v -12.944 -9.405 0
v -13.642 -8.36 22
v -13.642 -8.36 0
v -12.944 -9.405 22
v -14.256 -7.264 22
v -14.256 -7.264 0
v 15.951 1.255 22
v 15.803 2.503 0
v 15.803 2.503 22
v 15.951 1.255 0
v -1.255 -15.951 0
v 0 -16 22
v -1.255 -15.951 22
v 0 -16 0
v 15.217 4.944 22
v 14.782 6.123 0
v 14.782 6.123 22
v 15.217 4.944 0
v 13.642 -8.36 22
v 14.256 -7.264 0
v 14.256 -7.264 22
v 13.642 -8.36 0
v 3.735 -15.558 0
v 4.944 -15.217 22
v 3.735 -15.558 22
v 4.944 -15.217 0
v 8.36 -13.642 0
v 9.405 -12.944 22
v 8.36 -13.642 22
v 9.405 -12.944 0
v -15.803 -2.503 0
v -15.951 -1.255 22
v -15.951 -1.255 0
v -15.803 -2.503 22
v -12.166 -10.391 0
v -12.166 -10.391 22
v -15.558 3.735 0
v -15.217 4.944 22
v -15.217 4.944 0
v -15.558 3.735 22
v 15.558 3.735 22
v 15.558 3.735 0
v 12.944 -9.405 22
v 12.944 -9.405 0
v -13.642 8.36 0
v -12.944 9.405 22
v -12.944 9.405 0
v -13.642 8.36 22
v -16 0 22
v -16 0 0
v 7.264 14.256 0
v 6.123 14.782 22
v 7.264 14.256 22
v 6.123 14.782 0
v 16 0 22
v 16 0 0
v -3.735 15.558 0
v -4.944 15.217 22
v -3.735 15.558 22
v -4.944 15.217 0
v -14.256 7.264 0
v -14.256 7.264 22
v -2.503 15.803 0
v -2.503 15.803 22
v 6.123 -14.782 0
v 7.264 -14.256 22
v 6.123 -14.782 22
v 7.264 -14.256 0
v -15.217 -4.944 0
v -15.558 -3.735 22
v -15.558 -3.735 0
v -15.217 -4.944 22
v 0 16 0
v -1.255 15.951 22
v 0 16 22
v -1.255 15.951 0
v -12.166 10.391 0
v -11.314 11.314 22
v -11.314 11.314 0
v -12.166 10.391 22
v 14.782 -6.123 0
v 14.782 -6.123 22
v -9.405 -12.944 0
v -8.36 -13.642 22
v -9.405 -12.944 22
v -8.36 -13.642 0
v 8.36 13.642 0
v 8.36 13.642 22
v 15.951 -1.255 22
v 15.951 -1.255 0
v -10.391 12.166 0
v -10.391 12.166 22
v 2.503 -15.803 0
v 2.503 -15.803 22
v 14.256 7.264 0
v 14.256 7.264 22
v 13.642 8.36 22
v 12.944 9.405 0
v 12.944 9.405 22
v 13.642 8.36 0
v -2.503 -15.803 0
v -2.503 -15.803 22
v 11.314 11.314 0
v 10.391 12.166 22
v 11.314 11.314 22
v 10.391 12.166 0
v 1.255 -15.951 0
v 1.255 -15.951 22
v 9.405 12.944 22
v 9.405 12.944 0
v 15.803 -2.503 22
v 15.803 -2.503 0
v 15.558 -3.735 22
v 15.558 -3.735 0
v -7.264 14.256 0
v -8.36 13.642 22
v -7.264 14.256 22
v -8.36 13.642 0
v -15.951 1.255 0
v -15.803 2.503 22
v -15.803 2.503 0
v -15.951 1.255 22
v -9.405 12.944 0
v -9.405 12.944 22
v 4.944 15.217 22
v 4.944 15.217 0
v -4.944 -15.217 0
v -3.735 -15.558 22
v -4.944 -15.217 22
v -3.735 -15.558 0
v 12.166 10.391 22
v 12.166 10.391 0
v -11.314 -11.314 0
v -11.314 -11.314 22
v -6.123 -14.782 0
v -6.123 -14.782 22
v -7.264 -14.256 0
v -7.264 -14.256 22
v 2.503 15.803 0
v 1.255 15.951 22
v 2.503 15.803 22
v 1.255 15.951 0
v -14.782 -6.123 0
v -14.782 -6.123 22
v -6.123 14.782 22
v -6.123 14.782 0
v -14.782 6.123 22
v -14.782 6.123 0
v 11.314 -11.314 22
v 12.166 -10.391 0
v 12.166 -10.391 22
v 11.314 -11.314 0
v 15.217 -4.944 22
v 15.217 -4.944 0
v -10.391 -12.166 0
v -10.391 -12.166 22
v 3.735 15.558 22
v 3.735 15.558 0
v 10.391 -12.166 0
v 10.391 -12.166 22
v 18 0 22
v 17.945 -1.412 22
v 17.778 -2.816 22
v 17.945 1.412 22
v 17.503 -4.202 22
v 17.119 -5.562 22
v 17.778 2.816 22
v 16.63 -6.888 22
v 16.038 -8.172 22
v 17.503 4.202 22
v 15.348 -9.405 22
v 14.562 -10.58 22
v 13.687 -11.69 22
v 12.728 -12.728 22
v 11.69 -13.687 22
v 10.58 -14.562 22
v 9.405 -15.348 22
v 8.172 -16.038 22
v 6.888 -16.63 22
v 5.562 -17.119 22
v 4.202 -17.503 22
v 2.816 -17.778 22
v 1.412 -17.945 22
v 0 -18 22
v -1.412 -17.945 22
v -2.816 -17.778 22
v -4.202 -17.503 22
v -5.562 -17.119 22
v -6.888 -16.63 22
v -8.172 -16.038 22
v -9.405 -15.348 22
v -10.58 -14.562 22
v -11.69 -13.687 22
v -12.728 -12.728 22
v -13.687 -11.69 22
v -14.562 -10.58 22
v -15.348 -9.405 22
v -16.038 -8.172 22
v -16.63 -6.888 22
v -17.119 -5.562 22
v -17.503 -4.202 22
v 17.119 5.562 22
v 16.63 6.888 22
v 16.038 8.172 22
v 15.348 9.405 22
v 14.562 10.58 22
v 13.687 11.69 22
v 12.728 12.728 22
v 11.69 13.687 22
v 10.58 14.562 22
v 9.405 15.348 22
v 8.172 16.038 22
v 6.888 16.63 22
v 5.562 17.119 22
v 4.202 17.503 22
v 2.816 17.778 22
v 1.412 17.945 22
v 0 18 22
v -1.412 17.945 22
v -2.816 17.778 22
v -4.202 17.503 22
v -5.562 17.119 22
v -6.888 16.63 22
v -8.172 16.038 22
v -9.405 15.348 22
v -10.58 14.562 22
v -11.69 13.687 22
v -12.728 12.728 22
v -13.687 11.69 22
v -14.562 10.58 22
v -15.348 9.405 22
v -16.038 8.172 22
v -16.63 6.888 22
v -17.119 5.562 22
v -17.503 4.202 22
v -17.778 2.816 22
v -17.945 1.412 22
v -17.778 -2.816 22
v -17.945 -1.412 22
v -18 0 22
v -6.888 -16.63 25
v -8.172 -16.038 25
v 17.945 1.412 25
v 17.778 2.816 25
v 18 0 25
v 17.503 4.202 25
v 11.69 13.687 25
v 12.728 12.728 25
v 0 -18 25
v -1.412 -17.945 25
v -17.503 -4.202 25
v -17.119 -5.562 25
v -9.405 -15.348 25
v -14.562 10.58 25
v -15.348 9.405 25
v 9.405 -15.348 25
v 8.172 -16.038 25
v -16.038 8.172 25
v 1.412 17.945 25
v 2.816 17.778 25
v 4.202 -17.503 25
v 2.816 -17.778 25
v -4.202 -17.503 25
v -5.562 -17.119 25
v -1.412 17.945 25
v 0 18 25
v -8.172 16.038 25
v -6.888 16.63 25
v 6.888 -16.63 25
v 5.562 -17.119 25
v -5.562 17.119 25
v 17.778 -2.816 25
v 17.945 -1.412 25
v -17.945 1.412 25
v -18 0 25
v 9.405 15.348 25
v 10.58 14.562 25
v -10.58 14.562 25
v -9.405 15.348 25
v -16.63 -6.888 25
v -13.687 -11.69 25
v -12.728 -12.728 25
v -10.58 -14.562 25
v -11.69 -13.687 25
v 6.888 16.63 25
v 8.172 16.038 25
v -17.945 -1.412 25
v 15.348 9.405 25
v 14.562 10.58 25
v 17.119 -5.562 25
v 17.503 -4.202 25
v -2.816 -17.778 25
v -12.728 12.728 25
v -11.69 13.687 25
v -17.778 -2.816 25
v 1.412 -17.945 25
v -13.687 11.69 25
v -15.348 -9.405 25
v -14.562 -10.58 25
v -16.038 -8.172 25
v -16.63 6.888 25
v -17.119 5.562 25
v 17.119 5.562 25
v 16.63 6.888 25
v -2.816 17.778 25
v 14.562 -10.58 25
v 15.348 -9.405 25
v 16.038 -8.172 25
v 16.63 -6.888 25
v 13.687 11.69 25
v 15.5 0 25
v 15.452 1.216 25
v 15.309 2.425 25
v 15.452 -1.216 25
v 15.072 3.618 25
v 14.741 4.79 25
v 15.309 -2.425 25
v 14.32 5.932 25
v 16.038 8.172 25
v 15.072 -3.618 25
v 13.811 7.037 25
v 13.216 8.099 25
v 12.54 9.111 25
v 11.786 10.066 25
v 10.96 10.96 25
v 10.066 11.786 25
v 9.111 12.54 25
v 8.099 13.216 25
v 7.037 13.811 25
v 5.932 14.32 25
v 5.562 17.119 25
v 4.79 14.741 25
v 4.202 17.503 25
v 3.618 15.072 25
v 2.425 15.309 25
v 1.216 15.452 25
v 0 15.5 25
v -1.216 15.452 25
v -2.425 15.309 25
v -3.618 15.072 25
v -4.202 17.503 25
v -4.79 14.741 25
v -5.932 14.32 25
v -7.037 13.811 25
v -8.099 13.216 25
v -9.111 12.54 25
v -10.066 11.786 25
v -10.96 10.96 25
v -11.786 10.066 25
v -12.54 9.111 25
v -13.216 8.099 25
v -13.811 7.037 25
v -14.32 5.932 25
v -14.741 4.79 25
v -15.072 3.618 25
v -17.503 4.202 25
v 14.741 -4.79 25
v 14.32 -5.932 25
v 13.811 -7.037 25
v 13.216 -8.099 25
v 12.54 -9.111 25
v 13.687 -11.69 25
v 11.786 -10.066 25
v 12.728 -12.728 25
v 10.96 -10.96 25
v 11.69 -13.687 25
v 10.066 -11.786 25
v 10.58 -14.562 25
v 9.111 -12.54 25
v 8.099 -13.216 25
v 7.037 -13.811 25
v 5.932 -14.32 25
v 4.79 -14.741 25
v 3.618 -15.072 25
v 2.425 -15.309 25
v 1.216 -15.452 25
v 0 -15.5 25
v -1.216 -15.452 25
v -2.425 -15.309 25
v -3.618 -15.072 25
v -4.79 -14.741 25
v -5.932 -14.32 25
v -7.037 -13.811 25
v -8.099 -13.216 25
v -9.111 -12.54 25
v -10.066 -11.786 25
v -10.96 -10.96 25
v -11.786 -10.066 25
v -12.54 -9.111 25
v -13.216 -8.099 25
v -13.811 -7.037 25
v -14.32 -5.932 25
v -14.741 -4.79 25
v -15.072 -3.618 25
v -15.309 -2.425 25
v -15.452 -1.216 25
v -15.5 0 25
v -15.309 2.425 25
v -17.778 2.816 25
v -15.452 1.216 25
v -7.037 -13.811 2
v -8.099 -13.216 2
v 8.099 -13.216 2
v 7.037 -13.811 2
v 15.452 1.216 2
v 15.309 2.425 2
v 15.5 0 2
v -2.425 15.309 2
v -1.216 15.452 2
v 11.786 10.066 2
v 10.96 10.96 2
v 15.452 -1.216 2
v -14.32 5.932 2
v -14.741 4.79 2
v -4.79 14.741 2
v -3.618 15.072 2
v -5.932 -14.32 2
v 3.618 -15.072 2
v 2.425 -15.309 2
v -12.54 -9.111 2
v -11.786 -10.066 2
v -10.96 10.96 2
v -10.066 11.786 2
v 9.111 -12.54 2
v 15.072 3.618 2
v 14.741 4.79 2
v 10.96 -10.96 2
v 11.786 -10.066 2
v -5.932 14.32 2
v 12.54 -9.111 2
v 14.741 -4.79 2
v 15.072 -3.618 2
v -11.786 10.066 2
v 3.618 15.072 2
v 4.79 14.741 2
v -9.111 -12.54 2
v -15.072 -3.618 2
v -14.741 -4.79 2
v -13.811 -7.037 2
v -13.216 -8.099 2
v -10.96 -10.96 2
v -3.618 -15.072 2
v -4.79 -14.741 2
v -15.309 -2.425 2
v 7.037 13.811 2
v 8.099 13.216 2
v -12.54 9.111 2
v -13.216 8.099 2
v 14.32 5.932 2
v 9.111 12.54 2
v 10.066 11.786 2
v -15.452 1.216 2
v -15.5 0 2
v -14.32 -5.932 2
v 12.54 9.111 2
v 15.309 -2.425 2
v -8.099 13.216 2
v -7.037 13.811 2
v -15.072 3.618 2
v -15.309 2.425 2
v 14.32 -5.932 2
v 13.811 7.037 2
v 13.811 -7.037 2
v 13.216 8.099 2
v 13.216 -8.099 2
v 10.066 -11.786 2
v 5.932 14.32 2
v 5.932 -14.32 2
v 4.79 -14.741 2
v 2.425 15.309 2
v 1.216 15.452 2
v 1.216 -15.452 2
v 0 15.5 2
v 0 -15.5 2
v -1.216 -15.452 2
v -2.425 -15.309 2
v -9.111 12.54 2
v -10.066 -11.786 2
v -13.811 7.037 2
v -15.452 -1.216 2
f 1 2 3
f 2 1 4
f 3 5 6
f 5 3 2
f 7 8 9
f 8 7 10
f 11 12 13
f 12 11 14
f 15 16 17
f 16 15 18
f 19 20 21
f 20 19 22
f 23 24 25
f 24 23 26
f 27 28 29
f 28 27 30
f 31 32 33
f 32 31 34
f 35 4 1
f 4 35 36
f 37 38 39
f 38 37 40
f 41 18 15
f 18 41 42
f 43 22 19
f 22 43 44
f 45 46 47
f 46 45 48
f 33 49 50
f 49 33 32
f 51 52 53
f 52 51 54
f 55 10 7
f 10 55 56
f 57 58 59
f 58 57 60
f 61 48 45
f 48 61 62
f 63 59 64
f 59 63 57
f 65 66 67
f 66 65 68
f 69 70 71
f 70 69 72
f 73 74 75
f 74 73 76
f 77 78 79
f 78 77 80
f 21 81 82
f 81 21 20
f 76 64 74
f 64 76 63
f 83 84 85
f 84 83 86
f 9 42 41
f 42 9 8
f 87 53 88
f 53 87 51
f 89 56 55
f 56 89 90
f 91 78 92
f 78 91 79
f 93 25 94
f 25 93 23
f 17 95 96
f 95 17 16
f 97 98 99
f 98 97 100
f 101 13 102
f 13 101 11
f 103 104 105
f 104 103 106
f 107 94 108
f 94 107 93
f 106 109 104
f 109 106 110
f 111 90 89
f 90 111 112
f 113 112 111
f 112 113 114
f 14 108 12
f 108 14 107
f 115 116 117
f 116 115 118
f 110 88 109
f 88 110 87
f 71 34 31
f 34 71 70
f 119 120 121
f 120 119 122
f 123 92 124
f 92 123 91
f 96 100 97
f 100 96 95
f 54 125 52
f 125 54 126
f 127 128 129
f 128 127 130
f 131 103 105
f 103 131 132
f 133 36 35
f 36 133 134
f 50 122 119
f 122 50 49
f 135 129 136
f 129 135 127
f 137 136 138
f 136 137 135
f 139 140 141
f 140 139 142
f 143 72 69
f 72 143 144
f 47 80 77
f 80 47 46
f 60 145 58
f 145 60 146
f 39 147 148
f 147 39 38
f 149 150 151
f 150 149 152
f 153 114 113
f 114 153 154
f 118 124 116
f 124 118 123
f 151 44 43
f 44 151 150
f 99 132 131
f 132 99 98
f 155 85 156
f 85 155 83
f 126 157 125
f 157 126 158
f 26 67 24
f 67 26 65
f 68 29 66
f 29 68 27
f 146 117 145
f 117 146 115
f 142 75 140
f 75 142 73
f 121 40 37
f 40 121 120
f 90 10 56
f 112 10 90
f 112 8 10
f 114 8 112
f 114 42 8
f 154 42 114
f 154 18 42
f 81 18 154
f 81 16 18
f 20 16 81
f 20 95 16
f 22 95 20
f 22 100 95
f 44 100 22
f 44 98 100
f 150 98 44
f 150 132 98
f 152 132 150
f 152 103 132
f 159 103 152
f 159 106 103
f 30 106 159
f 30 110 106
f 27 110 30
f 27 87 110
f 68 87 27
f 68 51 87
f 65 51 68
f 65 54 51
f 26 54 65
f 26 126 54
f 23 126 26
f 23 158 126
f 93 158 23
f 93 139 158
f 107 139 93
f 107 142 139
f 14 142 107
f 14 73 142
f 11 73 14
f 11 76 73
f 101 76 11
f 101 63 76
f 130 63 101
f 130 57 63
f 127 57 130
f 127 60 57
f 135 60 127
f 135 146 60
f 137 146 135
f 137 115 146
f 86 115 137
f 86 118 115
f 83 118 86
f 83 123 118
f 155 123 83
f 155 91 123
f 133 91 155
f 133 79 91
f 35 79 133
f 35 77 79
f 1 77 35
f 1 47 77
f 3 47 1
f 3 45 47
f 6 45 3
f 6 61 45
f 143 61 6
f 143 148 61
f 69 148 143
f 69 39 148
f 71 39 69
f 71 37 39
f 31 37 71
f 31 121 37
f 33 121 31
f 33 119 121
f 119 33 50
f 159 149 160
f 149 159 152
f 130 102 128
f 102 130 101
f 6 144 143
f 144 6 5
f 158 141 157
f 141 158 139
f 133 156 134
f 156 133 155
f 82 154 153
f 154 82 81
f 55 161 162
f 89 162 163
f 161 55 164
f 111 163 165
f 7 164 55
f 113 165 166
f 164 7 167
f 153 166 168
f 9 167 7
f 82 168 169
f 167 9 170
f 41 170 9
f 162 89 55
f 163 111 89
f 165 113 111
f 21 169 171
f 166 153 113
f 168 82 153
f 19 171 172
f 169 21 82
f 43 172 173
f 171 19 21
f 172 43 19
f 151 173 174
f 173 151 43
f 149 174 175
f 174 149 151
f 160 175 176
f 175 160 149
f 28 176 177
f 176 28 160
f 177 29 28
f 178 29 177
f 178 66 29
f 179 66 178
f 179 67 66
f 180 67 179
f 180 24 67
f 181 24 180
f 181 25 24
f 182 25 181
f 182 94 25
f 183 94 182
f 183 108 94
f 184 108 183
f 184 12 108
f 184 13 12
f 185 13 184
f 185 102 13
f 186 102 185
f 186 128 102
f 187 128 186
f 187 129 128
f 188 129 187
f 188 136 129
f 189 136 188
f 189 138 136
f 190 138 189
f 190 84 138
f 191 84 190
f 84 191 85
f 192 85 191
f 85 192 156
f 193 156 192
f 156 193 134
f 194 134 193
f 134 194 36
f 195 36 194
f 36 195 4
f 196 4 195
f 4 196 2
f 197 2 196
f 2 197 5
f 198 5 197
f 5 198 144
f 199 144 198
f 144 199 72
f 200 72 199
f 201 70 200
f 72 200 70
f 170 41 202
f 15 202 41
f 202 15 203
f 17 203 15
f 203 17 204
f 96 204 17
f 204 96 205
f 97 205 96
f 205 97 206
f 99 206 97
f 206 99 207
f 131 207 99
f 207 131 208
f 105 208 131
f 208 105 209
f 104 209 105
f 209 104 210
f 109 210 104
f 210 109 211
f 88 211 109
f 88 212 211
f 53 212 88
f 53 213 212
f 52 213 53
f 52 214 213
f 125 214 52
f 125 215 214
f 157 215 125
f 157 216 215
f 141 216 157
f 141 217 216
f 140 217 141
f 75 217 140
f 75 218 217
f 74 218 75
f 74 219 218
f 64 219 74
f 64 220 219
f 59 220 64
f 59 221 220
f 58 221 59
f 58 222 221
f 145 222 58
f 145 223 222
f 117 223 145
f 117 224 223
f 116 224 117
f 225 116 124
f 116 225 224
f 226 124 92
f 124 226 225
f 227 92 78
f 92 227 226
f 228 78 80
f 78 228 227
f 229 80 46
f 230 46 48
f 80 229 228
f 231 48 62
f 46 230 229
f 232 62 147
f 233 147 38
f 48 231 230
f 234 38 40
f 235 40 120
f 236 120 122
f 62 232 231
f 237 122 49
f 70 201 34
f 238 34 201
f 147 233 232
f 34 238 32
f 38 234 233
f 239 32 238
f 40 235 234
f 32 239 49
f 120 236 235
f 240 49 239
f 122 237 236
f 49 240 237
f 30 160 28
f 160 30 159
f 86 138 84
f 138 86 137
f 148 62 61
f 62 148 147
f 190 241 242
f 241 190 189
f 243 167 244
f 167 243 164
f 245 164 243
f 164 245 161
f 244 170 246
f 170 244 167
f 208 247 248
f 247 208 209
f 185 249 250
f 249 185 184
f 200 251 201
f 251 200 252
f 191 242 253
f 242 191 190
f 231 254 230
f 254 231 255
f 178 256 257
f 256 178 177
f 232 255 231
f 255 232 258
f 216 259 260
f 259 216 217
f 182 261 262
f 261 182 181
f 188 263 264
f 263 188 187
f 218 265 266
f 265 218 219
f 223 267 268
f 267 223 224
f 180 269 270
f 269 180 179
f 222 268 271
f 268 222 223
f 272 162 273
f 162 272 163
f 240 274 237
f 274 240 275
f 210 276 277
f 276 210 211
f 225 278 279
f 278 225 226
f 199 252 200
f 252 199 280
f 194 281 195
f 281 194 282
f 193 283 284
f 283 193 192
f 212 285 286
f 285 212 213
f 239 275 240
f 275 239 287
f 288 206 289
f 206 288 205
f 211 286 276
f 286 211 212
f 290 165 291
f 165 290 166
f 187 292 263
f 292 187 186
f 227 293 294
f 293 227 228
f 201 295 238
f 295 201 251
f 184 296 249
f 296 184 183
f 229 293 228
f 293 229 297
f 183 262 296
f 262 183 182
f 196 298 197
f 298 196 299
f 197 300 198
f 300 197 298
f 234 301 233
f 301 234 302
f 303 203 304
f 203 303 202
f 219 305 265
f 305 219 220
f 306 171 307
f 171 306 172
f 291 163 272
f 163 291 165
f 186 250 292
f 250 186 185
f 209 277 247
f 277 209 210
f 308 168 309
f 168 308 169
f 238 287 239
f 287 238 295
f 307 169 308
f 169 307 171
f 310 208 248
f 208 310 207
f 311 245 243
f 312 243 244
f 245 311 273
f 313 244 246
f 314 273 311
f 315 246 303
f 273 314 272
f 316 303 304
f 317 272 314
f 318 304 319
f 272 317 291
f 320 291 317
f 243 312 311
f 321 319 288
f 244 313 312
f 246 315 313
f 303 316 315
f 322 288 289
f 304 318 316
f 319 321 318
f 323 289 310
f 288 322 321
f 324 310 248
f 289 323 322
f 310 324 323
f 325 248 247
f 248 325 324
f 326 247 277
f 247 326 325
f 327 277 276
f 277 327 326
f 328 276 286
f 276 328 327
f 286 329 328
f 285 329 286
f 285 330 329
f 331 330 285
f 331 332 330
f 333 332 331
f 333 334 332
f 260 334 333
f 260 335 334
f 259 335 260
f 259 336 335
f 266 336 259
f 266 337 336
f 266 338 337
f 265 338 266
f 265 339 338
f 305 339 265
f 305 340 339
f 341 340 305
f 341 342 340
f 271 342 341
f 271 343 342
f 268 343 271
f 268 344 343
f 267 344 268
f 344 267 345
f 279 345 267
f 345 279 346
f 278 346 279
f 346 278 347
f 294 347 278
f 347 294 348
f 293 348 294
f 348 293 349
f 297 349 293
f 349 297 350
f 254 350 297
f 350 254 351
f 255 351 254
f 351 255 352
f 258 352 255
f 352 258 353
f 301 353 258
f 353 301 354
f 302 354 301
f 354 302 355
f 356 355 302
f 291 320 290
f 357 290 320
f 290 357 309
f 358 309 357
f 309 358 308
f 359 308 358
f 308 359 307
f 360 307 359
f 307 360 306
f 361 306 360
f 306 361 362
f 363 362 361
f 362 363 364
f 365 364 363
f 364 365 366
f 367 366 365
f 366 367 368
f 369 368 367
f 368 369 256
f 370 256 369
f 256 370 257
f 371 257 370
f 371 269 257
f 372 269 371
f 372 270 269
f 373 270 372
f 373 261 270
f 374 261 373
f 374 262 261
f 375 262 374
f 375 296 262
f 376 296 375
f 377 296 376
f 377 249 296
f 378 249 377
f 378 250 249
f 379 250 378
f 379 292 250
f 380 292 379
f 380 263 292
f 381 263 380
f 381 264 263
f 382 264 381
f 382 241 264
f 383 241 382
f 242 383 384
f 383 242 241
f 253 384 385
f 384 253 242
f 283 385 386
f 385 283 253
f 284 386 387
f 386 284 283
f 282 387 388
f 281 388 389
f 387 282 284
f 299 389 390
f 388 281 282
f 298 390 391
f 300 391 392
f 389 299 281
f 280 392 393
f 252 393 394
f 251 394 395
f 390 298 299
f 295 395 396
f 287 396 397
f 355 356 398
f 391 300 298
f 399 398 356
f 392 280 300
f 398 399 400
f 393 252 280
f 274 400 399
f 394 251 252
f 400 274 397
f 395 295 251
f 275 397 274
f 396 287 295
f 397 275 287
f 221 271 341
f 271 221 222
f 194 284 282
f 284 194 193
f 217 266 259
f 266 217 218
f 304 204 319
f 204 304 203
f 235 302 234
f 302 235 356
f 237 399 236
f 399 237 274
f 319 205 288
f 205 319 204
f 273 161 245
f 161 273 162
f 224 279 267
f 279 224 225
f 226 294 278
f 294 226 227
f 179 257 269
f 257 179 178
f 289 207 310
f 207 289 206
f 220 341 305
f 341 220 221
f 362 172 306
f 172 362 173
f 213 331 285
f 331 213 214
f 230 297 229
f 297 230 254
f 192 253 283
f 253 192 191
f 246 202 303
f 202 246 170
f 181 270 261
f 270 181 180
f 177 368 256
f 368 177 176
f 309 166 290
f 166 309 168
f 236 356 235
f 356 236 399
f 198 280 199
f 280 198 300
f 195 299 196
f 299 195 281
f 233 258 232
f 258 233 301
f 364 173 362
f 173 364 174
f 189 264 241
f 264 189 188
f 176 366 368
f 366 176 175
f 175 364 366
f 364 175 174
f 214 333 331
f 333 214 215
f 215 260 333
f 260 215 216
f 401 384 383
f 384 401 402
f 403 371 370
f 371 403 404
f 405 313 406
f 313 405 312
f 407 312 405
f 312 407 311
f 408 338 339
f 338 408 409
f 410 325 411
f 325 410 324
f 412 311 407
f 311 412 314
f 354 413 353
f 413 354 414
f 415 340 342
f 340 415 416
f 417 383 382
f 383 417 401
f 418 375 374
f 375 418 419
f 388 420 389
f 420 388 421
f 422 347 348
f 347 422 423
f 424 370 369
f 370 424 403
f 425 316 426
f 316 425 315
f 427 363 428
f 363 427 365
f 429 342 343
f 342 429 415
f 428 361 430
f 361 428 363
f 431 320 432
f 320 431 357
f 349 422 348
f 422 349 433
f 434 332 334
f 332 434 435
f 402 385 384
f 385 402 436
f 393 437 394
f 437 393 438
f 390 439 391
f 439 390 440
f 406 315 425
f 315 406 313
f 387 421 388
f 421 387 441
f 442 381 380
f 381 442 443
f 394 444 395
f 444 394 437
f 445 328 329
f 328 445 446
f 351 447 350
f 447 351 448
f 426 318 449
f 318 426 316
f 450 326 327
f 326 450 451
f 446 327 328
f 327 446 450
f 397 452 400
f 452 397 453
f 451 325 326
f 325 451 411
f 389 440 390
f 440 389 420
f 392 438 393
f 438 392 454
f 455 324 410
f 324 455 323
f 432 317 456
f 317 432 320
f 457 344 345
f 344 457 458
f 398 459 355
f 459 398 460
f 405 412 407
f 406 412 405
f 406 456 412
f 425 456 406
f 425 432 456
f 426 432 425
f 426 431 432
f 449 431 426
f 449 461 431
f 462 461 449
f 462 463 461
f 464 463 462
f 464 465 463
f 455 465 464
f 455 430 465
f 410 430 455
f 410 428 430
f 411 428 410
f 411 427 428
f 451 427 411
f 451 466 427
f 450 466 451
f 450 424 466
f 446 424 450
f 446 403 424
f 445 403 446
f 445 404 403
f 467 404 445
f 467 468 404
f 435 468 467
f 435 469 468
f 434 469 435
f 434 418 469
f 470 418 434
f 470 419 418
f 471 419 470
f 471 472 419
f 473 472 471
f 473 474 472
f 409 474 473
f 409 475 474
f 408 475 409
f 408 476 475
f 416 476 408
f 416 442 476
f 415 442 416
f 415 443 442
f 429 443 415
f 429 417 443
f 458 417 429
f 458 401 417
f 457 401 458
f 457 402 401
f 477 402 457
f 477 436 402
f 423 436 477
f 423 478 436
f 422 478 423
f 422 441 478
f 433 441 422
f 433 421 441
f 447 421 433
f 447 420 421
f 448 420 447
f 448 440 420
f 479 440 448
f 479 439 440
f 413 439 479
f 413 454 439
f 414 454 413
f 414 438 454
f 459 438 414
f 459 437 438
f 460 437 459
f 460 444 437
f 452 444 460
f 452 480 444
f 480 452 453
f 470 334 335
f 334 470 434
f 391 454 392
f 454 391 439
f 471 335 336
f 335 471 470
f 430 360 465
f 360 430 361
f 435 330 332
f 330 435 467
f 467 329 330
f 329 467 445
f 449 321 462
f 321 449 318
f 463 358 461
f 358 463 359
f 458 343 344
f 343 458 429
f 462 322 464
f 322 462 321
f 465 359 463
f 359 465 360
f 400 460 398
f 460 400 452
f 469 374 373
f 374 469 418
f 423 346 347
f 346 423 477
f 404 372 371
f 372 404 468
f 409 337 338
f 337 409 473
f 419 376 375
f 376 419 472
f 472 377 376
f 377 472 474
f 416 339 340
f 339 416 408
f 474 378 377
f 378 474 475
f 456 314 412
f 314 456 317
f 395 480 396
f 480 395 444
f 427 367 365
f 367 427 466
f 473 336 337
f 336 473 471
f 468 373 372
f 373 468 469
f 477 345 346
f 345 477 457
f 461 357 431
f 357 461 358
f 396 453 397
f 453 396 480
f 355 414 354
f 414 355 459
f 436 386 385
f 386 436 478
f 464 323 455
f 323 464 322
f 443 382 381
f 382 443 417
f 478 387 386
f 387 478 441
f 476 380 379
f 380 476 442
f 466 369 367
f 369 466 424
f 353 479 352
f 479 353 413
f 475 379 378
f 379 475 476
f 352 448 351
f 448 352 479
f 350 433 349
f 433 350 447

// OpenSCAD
$fn=80;

//back_plate();
//front_plate();
//leg();  //2 needed
//foot(); //3 needed
//cover_nema();
//cover_nema_CO();
//cover_AS_mounting();
//cover_AS_motor_holder();
//union_plates();
waste_bottle_holder_PA_printed();
//waste_bottle_holder_52x24();

//color("black", 1.0) { translate([215-137-5, 135-35, -12]) nema_14(); }  //for testing
//rotate([180, 0, 0]) translate([71.5, -137, 0]) cover_nema(); //for testing
//color("black", 0.2) {translate([168.4-5, 147, -3]) rotate([0, 180, 180])  cover_AS_motor_holder(); }
//translate([-10, -100, 0]) cube([10, 200, 5]);

module back_plate() {
difference() {
    union() {
        translate([-17, 0, 0]) square([249, 151]);

        }
    //cut-out Nema 14
    translate([71.35-0.5, 98.35, 0]) square([40, 39]);
    holes();
    //cutout z-motor holder
    translate([168.4, 75, 0]) square([28.2, 80]);
    //cuts for testing
    //translate([-20, -5, -1]) cube([260, 100, 6]);
    //translate([215-32.5-13.1-5-1+5, -5, -1]) cube([100, 220, 5]);
    }
}

module front_plate() {
    difference() {
        union() {
        translate([-17, -152, 0]) square([249, 152]);
        }
        holes();
        //cutout waste bottle
        translate([20, -37, 0]) circle(d=32.5);
        
        //cutout mounting-profile autosampler
        translate([168.4, -153, 0]) square([28.2, 83.5]);
    }
}

module holes() {
    for (i=[1:3])
        translate([-10, -160+i*40, 0]) slit_y();  //y
    for (i=[5:6])
        translate([-10, -170+i*40, 0]) slit_y();  //y
    for (i=[1:3])
        translate([215+10, -160+i*40, 0]) slit_y();  //y
    for (i=[5:6])
        translate([215+10, -170+i*40, 0]) slit_y();  //y
    for (i=[1:6])
        translate([i*35-30, 135+10, 0]) slit_x();  //x
    translate([5*40+5, 135+10, 0]) slit_x();  //x
    for (i=[1:3])
        translate([i*35-30, -135-10, 0]) slit_x();  //x
        translate([4*40-25, -135-10, 0]) slit_x();  //x
    translate([5*40+5, -135-10, 0]) slit_x();  //x
    //holes for legs
    translate([4*30-14, -135-10, 0]) circle(d=5.2); //front
    translate([-10.5, 110+8, 0]) circle(d=5.2);   //back
    translate([215+10, -130+8*30+8, 0]) circle(d=5.2); //back    
}

module union_plates() {
    difference() {
        union() {
        translate([0, -1, -1]) cube([215, 1, 5]);
        translate([-14, -11, -1]) cube([243, 21, 1]);
        translate([0, -11, 3]) cube([215, 21, 1]);
    }
    translate([22, -12, 0]) cube([21, 23, 8]);
}
}

module slit_x() {
    hull()  {
        circle(d=3.2);
        translate([8, 0, 0]) circle(d=3.2);
    }
}

module slit_y() {
    hull()  {
        circle(d=3.2);
        translate([0, 8, 0]) circle(d=3.2);
    }
}

module nema_14() {
    a=2.6;
    b=30.5;
    linear_extrude(height = 14)
    polygon(points=[[0,a],[0,a+b],[a,a+b+a],[a+b,a+b+a],[a+b+a,a+b],[a+b+a,a],[a+b,0],[a,0]]);
    //motor cables
    //#translate([-2.7, 35/2-4, 0]) cube([3, 9, 5]);
}

module profile() {  //for testing
    difference() {
        cube([20, 160, 5]);
        translate([7.5, 7.5, -1]) cube([5, 140, 8]);
    }
}

module leg() {
    difference() {
        union() {
        hull() {
            translate([7, 7, 0,]) cylinder(d=14, h=5);
            translate([19, 7, 0,]) cylinder(d=14, h=5);
        }
        translate([7,7,0]) cylinder(d=14, h=23);
    }
    translate([7,7,-1]) cylinder(d=10, h=20);
    translate([7,7,1]) cylinder(d=5.2, h=26);
    translate([19, 7, -1,]) cylinder(d=9, h=3.5, $fn=6);
    translate([19, 7, -1,]) cylinder(d=5.2, h=7);
}
}

module foot() {
    difference() {
        cylinder(d=14, h=6);
        translate([0, 0, 2]) cylinder(d=3.8, h=5);
    }
}

module cover_nema() {
    difference() {
        union() {
            cube([38, 38, 10]);
            translate([-5, -5, 0]) cube([38+10, 38+10, 3]);
        translate([-3, 35/2-5, 0]) cube([6, 11, 6]);
        }
    translate([1.15, 1.15, -2]) nema_14();
        //motor cables
    translate([-2, 35/2-4, -1]) cube([4, 9, 4]);
    }
    translate([0, 0, 10]) cube([38, 38, 2]);
}

module cover_nema_CO() {
    difference() {
        union() {
            cube([38, 38, 15]);
            translate([-5, -5, 0]) cube([38+10, 38+10, 3]);
        translate([-3, 35/2-5, 0]) cube([6, 11, 16]);
        }
    translate([1.15, 1.15, -2]) nema_14();
        //motor cables
    translate([-2, 35/2-4, -1]) cube([4, 9, 14]);
    }
    translate([0, 0, 15]) cube([38, 38, 2]);
}


module cover_AS_mounting() {
    difference() {
        cube([26.2+10, 79+5, 4]);
        translate([4.9, -1, -1]) cube([26.4, 80, 3.3]);
        translate([18.35, 66.5, 2]) cylinder(d=8.5, h=5);
        translate([18.35, 26.5, 2]) cylinder(d=8.5, h=5);
        translate([-1, -1, -1]) cube([38, 12, 6]);
    }
}

module cover_AS_motor_holder() {
    difference() {
        cube([26.2+10, 79, 4]);
        translate([4.9, -1, -1]) cube([26.4, 75, 3.3]);
        translate([18.35, 59, 2]) cylinder(d=8.5, h=5);
        translate([18.35, 24, 2]) cylinder(d=8.5, h=5);
    }
}

module waste_bottle_holder_PA_printed() {
    difference() {
        union() {
        cylinder(d=32, h=22);
        translate([0, 0, 22]) cylinder(d=36, h=3);
        }
        translate([0, 0, 2]) cylinder(d=31, h=26);
    }
}

module waste_bottle_holder_52x24() {
    difference() {
        union() {
        cylinder(d=32, h=22);
        translate([0, 0, 22]) cylinder(d=36, h=3);
        }
        translate([0, 0, 2]) cylinder(d=24.5, h=26);
    }
}
